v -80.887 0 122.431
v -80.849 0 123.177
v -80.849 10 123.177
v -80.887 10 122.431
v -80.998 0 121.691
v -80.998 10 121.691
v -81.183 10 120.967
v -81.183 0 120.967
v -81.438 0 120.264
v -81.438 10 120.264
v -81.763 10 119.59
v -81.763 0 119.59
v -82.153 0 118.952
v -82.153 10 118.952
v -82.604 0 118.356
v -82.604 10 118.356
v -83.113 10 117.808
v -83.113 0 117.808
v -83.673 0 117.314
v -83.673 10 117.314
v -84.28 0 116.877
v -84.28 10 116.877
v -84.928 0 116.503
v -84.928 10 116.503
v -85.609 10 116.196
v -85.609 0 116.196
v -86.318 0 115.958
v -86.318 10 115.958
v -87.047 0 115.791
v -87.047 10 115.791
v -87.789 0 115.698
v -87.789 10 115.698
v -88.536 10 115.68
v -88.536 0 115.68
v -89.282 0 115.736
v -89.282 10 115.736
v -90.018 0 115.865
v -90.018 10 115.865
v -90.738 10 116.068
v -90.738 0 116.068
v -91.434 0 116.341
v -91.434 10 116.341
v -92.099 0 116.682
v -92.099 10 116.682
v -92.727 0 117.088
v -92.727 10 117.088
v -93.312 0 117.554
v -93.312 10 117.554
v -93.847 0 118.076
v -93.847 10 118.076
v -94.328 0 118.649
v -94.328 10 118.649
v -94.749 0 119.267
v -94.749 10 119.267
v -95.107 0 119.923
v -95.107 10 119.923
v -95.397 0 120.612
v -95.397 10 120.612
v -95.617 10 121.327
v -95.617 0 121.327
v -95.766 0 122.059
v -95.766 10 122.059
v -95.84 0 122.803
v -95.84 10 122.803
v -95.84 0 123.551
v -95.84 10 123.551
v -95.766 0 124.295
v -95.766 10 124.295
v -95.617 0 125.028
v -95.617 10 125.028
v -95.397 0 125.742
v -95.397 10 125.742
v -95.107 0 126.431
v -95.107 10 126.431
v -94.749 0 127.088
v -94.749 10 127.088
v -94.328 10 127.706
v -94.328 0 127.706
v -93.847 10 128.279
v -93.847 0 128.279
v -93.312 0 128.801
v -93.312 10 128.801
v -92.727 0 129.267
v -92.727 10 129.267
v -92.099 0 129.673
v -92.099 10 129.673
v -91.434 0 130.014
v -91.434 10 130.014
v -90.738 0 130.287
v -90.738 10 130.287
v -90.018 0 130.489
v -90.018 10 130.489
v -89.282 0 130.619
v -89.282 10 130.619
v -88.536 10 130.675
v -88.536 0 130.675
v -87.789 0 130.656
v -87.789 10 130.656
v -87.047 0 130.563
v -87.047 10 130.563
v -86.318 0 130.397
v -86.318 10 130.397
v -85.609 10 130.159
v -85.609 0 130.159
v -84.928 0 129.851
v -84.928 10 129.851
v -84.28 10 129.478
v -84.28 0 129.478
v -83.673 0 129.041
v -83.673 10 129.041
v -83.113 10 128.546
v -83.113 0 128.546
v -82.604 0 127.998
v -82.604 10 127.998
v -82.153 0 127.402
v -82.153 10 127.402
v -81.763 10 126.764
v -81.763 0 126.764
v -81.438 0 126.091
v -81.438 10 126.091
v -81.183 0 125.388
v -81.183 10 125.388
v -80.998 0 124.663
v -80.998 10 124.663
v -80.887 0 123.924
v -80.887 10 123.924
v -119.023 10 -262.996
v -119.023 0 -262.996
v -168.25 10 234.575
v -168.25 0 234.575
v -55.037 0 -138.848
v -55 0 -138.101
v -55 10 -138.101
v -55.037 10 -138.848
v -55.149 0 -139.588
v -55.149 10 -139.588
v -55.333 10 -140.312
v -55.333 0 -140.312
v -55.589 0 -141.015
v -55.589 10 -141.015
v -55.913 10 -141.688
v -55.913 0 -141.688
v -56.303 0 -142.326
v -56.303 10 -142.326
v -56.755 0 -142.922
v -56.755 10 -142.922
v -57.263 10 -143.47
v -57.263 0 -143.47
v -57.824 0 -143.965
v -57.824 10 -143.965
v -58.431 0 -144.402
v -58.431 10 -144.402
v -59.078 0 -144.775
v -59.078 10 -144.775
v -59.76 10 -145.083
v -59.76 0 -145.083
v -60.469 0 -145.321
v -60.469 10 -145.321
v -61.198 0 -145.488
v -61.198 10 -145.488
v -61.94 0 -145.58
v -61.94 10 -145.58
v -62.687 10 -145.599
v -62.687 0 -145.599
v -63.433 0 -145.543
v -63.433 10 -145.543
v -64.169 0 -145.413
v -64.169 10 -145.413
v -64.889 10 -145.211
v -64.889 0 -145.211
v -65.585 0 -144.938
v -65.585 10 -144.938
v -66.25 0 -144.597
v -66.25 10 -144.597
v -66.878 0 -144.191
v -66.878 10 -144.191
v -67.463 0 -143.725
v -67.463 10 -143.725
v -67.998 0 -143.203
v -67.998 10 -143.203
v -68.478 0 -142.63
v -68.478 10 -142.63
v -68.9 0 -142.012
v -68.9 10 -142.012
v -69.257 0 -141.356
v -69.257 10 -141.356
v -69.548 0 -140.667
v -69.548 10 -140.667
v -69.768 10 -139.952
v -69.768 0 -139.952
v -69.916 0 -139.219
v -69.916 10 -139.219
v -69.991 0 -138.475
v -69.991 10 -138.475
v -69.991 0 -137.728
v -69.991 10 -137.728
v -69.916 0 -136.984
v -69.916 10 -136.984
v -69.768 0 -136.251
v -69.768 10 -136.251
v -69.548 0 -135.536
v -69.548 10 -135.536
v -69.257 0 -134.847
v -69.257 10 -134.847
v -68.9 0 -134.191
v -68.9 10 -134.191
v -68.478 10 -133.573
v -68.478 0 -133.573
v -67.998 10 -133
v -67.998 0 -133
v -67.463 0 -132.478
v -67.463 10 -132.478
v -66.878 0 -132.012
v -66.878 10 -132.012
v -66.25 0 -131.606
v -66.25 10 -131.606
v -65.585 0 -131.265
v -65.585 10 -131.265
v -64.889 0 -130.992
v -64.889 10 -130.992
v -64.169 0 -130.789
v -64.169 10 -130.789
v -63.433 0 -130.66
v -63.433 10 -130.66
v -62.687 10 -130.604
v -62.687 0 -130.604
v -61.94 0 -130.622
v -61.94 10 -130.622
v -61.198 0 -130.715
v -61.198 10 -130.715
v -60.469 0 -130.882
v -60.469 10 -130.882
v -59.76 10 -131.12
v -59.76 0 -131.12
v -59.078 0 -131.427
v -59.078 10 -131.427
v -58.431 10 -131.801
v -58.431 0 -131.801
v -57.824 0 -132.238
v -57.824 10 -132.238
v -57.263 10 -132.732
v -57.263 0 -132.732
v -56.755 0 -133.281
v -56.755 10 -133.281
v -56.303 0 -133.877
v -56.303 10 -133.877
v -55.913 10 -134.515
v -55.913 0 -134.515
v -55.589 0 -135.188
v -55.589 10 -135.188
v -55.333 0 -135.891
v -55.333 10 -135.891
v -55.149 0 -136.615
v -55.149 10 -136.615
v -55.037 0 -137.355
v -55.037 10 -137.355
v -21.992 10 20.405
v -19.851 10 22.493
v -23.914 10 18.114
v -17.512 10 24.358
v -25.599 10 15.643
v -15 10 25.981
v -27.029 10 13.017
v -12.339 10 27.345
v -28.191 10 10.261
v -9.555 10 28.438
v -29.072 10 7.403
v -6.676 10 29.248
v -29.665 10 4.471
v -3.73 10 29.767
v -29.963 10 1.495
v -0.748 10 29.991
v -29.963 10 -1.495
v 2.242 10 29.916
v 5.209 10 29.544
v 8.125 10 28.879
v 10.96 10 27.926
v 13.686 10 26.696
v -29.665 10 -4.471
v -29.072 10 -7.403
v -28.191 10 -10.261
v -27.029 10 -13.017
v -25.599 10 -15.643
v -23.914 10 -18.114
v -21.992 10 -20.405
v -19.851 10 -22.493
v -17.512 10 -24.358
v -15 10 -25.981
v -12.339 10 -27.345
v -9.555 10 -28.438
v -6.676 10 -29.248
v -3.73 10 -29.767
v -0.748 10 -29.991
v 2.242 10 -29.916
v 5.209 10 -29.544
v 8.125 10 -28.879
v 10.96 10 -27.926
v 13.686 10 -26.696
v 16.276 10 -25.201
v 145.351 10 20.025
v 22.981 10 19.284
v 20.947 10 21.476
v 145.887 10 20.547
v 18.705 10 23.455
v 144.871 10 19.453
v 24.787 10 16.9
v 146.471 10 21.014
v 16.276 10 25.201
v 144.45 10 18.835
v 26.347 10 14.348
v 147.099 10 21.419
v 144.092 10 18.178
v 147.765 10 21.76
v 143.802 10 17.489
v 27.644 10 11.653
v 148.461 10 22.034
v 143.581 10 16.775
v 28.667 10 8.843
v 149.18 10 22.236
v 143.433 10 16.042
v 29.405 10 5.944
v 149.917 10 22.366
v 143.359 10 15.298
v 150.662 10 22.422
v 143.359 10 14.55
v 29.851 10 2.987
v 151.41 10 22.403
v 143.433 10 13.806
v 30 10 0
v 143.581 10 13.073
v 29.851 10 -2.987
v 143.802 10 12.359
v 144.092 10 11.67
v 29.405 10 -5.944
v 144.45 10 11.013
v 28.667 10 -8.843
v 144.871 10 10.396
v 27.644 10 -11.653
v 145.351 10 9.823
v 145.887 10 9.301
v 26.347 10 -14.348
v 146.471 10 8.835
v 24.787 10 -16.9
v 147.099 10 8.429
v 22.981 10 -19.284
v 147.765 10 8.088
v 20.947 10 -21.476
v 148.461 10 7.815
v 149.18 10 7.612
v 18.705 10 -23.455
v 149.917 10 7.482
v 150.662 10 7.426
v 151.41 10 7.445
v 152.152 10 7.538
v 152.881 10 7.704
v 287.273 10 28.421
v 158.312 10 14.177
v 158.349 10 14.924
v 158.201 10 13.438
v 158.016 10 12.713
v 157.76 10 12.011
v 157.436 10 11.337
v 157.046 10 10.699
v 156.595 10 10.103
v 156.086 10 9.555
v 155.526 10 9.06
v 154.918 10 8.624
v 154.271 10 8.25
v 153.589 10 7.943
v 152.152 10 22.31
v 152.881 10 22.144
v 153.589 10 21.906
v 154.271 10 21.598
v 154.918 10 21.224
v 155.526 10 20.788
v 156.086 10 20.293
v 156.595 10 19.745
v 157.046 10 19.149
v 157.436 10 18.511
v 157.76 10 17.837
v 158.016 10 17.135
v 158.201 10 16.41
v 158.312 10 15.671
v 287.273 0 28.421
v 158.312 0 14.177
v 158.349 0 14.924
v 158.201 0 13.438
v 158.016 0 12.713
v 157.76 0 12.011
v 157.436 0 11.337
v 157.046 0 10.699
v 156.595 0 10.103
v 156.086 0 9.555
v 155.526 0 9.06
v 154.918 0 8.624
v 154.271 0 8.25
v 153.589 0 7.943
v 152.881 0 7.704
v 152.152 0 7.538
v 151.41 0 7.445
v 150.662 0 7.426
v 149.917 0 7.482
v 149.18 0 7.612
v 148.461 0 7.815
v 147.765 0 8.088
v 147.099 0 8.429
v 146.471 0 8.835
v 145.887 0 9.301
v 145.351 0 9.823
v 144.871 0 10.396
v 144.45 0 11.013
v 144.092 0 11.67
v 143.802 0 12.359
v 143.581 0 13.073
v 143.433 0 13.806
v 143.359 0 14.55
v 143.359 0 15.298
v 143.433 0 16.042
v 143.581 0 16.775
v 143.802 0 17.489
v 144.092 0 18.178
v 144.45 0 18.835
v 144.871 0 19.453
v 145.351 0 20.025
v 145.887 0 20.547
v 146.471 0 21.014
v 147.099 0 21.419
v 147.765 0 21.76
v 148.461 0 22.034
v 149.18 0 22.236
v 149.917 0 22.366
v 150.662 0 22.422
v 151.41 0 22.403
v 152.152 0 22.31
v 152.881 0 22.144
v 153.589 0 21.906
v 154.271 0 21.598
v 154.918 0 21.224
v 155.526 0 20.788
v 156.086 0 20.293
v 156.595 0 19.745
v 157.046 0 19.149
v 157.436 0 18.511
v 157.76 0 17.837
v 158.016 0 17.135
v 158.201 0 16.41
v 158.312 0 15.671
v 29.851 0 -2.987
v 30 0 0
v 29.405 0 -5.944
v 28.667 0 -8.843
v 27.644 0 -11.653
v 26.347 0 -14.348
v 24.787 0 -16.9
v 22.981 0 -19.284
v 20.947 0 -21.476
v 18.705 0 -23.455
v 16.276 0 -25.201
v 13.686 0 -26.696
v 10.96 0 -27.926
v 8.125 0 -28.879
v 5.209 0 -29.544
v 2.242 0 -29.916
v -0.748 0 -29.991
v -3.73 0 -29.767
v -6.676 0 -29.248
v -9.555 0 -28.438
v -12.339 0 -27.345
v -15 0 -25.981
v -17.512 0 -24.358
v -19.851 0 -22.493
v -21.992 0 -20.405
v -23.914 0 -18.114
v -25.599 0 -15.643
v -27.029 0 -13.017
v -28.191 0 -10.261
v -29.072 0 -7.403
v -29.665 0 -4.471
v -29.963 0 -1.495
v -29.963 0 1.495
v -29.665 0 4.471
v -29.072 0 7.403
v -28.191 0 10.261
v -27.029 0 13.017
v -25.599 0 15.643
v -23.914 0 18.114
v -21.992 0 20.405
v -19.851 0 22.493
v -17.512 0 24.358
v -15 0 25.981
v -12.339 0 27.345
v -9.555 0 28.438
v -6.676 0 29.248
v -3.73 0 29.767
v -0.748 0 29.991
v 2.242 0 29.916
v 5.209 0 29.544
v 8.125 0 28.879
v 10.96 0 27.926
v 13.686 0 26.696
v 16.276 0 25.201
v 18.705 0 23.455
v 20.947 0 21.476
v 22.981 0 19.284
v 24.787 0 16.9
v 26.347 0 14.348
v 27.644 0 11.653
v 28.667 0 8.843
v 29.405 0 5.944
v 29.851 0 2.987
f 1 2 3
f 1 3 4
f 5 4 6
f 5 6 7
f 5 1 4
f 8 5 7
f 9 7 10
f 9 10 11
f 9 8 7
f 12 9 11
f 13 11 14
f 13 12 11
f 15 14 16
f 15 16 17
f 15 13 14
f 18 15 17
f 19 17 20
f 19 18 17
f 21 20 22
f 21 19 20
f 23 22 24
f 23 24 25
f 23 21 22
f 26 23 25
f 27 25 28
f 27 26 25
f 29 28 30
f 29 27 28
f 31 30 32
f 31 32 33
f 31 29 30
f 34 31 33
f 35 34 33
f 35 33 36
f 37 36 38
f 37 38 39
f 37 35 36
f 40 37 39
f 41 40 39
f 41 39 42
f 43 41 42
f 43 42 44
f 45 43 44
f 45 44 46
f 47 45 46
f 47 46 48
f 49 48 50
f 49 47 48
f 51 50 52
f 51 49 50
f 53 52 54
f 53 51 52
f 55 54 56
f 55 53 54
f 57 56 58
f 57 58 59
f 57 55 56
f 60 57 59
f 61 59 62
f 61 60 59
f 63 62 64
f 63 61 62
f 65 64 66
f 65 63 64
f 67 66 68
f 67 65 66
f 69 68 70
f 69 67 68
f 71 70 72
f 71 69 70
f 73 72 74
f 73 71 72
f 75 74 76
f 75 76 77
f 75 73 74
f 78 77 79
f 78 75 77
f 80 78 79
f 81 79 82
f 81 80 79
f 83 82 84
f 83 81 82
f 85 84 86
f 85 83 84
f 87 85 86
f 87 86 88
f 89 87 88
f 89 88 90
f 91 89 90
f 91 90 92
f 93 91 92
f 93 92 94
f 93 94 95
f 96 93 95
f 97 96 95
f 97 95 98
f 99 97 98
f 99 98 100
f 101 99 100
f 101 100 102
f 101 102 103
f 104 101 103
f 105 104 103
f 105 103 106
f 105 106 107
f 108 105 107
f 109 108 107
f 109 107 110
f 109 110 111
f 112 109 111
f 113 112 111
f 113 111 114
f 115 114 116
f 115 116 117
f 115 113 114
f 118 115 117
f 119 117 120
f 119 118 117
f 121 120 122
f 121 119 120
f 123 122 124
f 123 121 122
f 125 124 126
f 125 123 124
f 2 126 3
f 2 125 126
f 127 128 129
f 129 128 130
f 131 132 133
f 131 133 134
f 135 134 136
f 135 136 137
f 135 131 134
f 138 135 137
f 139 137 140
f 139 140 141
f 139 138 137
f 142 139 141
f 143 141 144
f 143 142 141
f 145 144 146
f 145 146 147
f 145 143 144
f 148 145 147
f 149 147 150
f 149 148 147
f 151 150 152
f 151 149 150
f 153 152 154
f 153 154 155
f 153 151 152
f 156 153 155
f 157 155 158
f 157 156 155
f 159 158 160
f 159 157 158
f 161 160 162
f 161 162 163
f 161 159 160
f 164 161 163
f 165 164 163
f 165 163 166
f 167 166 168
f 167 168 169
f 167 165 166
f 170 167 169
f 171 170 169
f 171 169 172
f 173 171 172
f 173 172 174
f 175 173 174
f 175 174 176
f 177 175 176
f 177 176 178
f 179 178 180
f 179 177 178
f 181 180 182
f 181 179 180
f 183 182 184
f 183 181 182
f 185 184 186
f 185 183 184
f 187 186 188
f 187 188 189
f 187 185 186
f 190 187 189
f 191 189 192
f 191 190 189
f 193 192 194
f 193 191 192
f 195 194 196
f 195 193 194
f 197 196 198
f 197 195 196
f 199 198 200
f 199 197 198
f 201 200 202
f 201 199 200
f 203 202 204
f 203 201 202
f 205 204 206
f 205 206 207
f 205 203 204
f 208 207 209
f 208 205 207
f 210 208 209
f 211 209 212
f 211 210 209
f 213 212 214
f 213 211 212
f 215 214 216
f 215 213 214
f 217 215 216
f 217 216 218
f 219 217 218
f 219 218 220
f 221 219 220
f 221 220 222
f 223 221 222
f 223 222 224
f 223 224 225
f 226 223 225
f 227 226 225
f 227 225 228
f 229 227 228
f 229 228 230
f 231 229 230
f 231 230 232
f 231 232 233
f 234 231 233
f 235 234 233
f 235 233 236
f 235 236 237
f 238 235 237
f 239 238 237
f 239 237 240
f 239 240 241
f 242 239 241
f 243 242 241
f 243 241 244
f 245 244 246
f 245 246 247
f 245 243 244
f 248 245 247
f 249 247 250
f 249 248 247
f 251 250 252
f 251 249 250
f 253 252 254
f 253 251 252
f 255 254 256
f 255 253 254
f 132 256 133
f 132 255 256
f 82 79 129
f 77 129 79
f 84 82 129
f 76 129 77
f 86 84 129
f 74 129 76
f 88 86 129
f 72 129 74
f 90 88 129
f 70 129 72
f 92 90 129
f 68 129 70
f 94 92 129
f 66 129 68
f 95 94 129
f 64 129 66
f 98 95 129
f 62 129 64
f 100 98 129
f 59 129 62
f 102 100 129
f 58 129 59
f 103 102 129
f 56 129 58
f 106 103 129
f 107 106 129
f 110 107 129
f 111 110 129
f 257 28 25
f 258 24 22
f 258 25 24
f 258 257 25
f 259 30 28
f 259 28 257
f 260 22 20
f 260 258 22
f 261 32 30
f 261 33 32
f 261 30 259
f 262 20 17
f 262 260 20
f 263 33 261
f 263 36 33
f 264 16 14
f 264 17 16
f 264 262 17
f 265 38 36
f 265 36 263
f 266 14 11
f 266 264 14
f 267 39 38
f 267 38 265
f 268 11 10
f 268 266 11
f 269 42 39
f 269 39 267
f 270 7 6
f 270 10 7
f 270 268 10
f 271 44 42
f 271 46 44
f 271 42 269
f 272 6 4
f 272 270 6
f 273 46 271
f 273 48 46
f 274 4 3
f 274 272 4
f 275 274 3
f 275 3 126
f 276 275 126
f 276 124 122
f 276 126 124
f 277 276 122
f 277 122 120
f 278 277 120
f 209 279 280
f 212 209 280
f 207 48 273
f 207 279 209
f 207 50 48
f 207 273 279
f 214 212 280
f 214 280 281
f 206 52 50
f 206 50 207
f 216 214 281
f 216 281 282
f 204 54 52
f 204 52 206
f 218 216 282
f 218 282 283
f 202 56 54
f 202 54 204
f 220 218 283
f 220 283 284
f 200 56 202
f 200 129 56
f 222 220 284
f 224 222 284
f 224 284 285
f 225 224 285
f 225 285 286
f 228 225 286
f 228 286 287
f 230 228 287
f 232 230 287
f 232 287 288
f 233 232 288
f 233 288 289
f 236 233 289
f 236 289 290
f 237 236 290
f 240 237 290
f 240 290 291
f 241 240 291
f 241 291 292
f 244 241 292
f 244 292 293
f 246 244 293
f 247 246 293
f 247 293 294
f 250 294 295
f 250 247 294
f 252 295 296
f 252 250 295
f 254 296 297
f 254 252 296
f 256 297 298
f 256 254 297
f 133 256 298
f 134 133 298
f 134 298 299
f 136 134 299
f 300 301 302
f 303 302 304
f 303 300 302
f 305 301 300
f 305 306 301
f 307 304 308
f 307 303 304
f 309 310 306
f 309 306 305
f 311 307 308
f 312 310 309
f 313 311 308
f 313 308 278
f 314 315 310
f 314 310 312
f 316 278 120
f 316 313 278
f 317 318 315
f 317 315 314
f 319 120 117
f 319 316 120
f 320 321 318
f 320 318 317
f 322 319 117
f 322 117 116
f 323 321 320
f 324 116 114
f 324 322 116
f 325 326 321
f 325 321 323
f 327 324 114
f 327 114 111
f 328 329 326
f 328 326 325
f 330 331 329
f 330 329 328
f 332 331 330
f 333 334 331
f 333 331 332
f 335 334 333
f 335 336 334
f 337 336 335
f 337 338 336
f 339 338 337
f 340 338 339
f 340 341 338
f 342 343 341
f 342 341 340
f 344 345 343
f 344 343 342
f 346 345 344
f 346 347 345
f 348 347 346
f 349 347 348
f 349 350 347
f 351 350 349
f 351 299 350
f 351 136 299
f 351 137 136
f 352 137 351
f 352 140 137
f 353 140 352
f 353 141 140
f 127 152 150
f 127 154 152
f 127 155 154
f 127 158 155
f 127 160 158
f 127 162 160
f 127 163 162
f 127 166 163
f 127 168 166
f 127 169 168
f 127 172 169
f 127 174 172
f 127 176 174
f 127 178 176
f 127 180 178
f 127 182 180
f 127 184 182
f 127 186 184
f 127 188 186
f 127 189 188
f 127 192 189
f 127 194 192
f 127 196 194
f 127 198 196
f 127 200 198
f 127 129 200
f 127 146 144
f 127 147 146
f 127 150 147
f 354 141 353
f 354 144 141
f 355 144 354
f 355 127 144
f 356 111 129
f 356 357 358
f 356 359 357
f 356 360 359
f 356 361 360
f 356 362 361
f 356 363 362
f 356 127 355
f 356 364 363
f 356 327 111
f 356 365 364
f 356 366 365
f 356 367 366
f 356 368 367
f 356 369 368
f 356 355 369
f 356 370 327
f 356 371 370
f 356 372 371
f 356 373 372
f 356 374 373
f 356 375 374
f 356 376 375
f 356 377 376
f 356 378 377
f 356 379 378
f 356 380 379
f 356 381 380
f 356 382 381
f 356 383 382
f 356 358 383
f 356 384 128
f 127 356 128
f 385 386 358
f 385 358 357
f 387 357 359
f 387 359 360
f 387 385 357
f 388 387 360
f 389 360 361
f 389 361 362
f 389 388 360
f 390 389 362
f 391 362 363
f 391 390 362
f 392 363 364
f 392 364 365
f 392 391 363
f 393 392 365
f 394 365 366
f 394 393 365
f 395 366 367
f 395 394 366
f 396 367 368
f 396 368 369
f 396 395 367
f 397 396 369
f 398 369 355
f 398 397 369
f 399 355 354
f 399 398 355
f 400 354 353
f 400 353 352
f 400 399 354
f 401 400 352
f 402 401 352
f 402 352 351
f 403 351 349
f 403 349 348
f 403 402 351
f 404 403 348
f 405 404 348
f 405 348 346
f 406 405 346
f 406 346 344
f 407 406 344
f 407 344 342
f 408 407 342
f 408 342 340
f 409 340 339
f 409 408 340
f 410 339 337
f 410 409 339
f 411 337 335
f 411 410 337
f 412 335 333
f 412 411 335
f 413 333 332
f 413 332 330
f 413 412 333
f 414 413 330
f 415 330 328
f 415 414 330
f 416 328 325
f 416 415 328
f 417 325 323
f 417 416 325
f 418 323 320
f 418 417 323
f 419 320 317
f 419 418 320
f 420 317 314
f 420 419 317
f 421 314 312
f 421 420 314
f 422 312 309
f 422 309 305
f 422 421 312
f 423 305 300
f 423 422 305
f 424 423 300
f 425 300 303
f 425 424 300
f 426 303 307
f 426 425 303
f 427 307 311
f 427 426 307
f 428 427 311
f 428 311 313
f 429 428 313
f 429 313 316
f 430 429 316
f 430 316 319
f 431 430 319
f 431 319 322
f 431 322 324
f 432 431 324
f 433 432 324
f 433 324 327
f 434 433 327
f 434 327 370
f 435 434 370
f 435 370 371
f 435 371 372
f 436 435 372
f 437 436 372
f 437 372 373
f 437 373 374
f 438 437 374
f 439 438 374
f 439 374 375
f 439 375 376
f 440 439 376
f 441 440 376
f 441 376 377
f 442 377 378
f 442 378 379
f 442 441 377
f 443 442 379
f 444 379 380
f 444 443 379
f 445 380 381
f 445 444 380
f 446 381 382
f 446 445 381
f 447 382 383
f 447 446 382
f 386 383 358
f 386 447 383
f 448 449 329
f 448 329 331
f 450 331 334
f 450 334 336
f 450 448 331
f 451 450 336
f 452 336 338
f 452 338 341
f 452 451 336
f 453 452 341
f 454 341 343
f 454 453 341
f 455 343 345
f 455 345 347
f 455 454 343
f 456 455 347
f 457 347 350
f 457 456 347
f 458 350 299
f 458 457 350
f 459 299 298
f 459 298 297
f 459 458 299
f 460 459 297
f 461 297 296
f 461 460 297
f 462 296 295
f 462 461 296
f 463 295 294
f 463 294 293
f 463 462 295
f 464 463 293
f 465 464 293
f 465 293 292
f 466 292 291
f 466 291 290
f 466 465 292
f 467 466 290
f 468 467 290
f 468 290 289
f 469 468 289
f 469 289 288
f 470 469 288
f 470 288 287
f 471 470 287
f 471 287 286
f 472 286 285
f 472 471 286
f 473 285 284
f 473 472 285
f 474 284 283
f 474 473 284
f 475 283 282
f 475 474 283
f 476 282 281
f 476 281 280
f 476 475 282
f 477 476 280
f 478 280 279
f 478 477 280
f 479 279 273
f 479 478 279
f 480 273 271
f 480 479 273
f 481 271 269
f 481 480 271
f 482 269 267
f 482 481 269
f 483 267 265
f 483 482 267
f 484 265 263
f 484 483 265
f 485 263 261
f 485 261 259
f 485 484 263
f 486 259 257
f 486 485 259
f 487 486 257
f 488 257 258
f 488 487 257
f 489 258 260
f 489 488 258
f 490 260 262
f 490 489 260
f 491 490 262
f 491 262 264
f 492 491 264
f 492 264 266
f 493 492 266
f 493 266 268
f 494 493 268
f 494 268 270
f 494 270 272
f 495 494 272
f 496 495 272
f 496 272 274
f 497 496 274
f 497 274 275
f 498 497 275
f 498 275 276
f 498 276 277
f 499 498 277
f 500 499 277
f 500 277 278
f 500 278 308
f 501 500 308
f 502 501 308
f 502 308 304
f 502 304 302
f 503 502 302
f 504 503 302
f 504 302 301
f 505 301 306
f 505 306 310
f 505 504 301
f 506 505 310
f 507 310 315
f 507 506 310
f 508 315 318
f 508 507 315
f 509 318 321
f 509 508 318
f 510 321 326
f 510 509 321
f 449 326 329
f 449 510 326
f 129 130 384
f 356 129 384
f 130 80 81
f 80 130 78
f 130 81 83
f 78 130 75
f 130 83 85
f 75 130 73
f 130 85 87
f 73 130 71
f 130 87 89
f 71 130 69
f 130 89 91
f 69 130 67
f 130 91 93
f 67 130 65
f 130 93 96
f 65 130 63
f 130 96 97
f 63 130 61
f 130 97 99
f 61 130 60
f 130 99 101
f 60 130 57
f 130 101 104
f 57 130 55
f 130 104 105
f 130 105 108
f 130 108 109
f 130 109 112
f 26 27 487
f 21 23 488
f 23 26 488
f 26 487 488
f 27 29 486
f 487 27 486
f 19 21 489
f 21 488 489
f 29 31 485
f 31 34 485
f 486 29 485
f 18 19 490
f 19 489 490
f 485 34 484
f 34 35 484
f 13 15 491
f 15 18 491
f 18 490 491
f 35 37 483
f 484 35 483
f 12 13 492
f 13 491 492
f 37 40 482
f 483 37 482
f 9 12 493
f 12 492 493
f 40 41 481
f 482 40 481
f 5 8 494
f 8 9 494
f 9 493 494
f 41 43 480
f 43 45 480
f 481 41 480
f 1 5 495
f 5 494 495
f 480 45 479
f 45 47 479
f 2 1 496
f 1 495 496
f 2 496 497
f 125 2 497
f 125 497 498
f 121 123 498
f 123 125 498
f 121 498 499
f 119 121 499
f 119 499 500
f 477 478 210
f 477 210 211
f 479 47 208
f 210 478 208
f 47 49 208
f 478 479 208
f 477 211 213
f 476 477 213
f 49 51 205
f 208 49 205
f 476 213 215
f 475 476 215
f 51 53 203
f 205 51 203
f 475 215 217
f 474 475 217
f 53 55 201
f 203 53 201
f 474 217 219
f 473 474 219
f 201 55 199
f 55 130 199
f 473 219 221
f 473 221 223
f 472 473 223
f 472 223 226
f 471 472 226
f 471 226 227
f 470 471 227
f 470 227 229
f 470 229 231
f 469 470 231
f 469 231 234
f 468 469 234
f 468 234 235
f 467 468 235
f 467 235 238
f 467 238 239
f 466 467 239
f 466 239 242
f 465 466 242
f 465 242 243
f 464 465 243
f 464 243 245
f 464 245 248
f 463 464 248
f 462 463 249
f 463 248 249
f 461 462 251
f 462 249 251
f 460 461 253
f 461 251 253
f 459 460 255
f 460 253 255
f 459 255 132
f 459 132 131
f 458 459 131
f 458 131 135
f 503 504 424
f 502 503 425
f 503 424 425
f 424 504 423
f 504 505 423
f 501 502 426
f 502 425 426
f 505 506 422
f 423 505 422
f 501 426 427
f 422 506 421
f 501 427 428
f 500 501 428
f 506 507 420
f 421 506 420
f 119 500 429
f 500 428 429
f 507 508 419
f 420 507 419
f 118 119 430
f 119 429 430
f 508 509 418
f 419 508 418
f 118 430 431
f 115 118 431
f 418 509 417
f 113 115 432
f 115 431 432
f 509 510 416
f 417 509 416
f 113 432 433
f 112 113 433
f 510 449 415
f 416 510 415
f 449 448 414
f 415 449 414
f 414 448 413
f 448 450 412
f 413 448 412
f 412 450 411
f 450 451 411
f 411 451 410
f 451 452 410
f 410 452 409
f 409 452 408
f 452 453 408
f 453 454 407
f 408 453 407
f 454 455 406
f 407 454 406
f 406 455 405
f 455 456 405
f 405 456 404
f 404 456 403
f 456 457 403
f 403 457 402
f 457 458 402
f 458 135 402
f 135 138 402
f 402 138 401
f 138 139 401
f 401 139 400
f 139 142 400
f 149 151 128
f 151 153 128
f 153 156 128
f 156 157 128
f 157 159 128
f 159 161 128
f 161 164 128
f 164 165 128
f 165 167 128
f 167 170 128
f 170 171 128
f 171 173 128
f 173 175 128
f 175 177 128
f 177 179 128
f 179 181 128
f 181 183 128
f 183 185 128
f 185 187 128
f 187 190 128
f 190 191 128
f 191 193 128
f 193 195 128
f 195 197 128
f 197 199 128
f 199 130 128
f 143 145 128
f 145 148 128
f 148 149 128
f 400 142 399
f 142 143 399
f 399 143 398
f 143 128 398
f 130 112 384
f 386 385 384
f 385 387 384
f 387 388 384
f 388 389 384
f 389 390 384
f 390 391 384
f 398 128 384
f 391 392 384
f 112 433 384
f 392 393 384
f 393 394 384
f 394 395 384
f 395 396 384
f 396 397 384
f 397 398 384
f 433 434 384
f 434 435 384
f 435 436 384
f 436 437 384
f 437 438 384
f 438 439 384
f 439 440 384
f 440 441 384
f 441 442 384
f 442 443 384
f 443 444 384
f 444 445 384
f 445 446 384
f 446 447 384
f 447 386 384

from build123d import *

# Parameters (mm, degrees)
SKETCH1_R           = 7.5
SKETCH1_R_2         = 30
BOSS_EXTRUDE1_DEPTH = 10


with BuildPart() as part:
    # Sketch1 → Boss-Extrude1 (new body)
    with BuildSketch(Plane(origin=(0, 0, 0), x_dir=(1, 0, 0), z_dir=(0, 1, 0))):
        Polygon((287.272653599, -28.421045507), (-119.022979389, 262.995938582), (-168.24967421, -234.574893076), align=None)
        with Locations((-62.5, 138.101451046)):
            Circle(SKETCH1_R, mode=Mode.SUBTRACT)
        with Locations((150.849364905, -14.924137787)):
            Circle(SKETCH1_R, mode=Mode.SUBTRACT)
        with Locations((-88.349364905, -123.17731326)):
            Circle(SKETCH1_R, mode=Mode.SUBTRACT)
        Circle(SKETCH1_R_2, mode=Mode.SUBTRACT)
    extrude(amount=BOSS_EXTRUDE1_DEPTH)


solid = part.part
